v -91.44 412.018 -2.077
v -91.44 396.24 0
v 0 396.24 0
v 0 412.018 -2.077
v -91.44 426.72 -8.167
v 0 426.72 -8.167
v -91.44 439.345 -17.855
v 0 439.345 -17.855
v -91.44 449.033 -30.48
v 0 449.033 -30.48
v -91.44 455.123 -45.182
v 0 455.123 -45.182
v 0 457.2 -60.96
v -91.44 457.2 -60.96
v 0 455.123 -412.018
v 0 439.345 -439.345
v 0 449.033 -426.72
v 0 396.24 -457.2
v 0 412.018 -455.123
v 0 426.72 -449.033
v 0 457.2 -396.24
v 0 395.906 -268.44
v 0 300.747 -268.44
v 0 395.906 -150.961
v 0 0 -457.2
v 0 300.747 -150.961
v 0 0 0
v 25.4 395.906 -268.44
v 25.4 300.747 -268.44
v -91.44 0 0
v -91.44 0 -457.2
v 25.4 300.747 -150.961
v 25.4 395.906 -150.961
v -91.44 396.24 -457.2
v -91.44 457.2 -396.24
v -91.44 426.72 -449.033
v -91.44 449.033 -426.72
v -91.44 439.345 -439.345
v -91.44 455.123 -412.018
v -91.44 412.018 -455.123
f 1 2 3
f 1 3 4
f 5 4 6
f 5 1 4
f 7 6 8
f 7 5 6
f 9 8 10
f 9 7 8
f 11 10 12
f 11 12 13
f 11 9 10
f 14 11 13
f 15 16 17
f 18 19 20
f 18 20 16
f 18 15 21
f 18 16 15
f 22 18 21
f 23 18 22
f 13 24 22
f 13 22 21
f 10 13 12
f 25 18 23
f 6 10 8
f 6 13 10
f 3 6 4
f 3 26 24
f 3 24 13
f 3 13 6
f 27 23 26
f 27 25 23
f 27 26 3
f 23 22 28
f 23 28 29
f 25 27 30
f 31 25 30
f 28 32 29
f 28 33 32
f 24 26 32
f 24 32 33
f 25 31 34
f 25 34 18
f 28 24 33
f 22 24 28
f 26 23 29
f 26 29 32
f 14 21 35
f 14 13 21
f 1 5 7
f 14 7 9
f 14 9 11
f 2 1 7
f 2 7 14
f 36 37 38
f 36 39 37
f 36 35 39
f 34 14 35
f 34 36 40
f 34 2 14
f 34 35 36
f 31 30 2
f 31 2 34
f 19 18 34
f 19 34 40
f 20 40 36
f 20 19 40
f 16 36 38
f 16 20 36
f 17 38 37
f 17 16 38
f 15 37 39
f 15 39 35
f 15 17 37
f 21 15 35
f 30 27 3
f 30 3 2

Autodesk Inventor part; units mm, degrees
ref_plane "YZ Plane" through (0, 0, 0) normal (1, 0, 0) x (0, 1, 0)
ref_plane "XZ Plane" through (0, 0, 0) normal (0, 1, 0) x (-1, 0, 0)
ref_plane "XY Plane" through (0, 0, 0) normal (0, 0, 1) x (1, 0, 0)
sketch "Sketch1" plane through (0, 0, 0) normal (1, 0, 0) x (0, 1, 0)
  point P0 (0, 0)
sketch "Sketch2" plane through (0, 0, 0) normal (0, 1, 0) x (-1, 0, 0)
  line L0 (0, 0) -> (91.44, 0)
  line L1 (91.44, 0) -> (91.44, -457.2)
  line L2 (91.44, -457.2) -> (0, -457.2)
  line L3 (0, -457.2) -> (0, 0)
  dimension "d0" = 91.44
  dimension "d1" = 457.2
extrude "Extrusion1" add sketch "Sketch2" along normal blind 457.2
fillet "Fillet1" radius 60.96 2 edges at (-45.72, 457.2, 0) (-45.72, 457.2, -457.2)
sketch "Sketch3" plane through (0, 0, 0) normal (1, 0, 0) x (0, 0, -1)
  line L0 (150.961, 395.9055) -> (268.4404, 395.9055)
  line L1 (268.4404, 395.9055) -> (268.4404, 300.7472)
  line L2 (268.4404, 300.7472) -> (150.961, 300.7472)
  line L3 (150.961, 300.7472) -> (150.961, 395.9055)
  point P0 (0, 0)
extrude "Extrusion2" add sketch "Sketch3" along normal blind 25.4
properties part number "new tal lpart"
